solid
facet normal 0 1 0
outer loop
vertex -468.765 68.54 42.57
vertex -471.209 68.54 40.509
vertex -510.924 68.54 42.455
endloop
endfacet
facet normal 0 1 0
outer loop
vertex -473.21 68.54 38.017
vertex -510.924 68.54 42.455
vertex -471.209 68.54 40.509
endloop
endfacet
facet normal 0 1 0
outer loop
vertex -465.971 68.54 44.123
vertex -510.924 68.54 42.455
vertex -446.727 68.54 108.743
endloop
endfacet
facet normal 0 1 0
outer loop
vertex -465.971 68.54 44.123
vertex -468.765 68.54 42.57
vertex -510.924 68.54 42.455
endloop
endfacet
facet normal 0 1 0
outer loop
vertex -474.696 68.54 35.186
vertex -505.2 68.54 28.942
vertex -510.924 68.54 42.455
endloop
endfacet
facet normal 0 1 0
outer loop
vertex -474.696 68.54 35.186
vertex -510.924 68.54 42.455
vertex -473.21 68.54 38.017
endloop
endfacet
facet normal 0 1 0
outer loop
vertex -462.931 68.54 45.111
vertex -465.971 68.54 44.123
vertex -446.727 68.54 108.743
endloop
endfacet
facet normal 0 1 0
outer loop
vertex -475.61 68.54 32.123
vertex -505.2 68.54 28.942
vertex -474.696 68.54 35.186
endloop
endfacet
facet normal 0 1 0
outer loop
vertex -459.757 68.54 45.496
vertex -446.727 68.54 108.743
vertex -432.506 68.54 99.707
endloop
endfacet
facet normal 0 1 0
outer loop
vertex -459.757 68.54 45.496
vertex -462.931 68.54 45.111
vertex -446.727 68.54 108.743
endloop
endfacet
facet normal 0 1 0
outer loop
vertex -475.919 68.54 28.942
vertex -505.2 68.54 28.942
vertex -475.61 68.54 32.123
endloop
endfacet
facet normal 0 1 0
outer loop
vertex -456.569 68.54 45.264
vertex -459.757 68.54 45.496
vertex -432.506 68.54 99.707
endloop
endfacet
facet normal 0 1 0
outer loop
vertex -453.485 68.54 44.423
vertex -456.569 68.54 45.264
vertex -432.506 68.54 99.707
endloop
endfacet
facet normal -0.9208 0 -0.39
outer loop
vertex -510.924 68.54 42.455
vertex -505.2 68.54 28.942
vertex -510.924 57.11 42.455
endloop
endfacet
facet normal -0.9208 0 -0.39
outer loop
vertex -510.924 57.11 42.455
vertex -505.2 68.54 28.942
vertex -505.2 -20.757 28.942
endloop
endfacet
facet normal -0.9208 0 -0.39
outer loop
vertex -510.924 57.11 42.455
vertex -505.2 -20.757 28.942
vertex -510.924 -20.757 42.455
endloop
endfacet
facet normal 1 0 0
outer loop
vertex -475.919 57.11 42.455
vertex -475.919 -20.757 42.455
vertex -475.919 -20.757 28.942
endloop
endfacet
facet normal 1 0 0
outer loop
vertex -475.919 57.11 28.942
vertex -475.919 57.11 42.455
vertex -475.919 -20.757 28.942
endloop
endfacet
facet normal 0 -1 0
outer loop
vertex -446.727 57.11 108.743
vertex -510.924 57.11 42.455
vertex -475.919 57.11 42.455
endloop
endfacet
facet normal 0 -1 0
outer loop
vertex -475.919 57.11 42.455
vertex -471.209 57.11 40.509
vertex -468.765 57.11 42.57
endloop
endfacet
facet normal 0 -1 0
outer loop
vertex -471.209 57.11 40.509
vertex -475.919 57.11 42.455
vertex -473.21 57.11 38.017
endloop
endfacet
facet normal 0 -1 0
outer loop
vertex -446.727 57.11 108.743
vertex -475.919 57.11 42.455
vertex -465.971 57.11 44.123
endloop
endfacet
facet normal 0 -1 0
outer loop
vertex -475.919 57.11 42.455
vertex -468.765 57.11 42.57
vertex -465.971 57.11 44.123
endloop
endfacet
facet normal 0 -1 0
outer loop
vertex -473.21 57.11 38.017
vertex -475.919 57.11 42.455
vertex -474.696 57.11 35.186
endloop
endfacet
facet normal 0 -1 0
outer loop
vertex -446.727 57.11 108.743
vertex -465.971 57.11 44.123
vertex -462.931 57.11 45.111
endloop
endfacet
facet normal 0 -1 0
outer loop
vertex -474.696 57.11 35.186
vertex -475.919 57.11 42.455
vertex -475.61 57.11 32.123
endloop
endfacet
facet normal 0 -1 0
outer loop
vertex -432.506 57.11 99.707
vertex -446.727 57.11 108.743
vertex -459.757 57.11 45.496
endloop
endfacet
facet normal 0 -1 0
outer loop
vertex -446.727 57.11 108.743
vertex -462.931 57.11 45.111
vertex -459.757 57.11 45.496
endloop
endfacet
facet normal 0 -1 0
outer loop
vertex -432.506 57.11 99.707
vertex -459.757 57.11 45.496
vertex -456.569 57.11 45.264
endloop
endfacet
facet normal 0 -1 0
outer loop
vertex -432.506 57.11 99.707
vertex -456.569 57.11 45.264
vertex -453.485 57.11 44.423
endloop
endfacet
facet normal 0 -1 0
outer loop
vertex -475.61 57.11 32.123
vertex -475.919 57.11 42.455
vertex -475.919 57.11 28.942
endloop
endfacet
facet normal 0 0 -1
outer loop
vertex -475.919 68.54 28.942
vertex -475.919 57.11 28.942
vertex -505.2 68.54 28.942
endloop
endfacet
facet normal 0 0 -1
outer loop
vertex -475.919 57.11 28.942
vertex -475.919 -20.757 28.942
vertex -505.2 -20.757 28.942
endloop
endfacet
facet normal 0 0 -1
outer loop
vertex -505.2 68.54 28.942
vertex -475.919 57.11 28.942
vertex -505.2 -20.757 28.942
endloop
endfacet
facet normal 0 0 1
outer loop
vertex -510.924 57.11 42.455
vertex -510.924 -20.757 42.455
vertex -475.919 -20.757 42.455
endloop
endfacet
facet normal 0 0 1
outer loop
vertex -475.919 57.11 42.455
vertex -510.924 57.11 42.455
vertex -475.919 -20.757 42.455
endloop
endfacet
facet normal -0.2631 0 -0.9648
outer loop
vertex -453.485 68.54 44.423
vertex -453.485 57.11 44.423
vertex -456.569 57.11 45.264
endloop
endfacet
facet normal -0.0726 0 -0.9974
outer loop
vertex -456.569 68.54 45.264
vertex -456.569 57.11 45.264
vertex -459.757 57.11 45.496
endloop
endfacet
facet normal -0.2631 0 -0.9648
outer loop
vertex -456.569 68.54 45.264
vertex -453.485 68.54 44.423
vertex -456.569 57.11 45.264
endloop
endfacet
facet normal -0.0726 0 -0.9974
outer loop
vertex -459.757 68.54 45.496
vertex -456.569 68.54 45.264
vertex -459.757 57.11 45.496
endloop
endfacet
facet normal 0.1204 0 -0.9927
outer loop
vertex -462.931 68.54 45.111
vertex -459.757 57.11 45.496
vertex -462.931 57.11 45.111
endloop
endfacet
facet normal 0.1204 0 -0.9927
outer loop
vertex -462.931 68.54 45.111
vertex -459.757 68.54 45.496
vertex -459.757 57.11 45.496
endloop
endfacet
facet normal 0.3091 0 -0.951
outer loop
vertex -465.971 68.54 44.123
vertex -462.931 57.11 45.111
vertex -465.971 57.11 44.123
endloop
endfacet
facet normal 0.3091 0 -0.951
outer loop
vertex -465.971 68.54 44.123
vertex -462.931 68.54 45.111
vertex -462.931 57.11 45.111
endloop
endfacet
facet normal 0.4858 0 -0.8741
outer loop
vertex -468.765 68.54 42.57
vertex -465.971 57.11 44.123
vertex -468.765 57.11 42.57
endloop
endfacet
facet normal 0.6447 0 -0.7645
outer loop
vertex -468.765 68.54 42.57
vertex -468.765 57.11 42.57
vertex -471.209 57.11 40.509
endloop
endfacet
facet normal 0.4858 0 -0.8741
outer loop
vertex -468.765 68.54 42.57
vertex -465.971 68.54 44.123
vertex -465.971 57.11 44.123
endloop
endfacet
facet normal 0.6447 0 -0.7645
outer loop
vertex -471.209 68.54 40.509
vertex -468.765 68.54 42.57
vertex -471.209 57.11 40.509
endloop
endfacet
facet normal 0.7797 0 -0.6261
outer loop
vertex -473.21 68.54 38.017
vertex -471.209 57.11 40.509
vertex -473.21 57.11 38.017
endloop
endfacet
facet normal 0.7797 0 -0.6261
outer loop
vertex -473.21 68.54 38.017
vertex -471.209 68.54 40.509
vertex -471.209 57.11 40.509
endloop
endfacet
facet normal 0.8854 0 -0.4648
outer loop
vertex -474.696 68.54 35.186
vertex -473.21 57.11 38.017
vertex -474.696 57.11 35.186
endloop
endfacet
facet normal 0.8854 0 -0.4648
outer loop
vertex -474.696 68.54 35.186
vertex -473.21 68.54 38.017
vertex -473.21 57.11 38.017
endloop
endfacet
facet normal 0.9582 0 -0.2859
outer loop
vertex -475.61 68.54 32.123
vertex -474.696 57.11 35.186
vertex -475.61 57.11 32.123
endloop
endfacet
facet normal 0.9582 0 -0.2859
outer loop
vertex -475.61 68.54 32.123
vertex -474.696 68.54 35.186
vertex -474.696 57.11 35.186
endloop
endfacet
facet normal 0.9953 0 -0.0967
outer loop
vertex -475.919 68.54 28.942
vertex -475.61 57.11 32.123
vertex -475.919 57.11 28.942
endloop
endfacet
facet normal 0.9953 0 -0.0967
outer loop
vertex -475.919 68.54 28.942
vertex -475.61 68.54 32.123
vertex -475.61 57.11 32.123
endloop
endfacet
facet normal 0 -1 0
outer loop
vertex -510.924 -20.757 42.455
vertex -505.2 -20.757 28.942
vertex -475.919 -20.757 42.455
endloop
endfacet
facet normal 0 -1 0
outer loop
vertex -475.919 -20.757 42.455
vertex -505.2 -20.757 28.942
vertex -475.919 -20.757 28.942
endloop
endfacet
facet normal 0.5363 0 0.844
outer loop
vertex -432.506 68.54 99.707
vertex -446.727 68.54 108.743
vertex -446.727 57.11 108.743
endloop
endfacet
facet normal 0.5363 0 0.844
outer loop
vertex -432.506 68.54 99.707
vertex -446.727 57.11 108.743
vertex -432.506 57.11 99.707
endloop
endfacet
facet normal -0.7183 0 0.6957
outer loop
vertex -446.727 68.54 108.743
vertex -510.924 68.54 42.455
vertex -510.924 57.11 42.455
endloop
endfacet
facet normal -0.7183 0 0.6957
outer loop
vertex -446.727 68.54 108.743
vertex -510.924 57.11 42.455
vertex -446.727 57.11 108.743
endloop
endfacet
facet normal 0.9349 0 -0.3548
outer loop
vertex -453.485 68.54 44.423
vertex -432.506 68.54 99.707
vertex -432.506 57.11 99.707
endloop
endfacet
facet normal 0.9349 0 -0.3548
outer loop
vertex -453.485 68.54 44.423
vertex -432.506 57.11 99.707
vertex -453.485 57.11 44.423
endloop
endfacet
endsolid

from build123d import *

# Parameters (mm, degrees)
BOSS_EXTRUDE1_DEPTH = 11.43
BOSS_EXTRUDE2_DEPTH = 77.866799282


with BuildPart() as part:
    # Sketch1 → Boss-Extrude1 (new body)
    with BuildSketch(Plane(origin=(0, 68.54, 0), x_dir=(1, 0, 0), z_dir=(0, 1, 0))):
        with BuildLine():
            Line((-505.199519379, -28.941561379), (-510.924193781, -42.454904444))
            Line((-510.924193781, -42.454904444), (-446.727083924, -108.742597242))
            Line((-446.727083924, -108.742597242), (-432.506297568, -99.706904201))
            Line((-432.506297568, -99.706904201), (-453.485090126, -44.423263798))
            ThreePointArc((-453.485090126, -44.423263798), (-468.76509838, -42.570216845), (-475.918740123, -28.941649602))
            Line((-475.918740123, -28.941649602), (-505.199519379, -28.941561379))
        make_face()
    extrude(amount=-BOSS_EXTRUDE1_DEPTH)

    # Sketch4 → Boss-Extrude2 (add)
    with BuildSketch(Plane(origin=(0, -20.756799282, 0), x_dir=(1, 0, 0), z_dir=(0, 1, 0))):
        Polygon((-505.199519379, -28.941561379), (-510.924193781, -42.454904444), (-475.918740123, -42.454904444), (-475.918740123, -28.941649602), align=None)
    extrude(amount=BOSS_EXTRUDE2_DEPTH)


solid = part.part
